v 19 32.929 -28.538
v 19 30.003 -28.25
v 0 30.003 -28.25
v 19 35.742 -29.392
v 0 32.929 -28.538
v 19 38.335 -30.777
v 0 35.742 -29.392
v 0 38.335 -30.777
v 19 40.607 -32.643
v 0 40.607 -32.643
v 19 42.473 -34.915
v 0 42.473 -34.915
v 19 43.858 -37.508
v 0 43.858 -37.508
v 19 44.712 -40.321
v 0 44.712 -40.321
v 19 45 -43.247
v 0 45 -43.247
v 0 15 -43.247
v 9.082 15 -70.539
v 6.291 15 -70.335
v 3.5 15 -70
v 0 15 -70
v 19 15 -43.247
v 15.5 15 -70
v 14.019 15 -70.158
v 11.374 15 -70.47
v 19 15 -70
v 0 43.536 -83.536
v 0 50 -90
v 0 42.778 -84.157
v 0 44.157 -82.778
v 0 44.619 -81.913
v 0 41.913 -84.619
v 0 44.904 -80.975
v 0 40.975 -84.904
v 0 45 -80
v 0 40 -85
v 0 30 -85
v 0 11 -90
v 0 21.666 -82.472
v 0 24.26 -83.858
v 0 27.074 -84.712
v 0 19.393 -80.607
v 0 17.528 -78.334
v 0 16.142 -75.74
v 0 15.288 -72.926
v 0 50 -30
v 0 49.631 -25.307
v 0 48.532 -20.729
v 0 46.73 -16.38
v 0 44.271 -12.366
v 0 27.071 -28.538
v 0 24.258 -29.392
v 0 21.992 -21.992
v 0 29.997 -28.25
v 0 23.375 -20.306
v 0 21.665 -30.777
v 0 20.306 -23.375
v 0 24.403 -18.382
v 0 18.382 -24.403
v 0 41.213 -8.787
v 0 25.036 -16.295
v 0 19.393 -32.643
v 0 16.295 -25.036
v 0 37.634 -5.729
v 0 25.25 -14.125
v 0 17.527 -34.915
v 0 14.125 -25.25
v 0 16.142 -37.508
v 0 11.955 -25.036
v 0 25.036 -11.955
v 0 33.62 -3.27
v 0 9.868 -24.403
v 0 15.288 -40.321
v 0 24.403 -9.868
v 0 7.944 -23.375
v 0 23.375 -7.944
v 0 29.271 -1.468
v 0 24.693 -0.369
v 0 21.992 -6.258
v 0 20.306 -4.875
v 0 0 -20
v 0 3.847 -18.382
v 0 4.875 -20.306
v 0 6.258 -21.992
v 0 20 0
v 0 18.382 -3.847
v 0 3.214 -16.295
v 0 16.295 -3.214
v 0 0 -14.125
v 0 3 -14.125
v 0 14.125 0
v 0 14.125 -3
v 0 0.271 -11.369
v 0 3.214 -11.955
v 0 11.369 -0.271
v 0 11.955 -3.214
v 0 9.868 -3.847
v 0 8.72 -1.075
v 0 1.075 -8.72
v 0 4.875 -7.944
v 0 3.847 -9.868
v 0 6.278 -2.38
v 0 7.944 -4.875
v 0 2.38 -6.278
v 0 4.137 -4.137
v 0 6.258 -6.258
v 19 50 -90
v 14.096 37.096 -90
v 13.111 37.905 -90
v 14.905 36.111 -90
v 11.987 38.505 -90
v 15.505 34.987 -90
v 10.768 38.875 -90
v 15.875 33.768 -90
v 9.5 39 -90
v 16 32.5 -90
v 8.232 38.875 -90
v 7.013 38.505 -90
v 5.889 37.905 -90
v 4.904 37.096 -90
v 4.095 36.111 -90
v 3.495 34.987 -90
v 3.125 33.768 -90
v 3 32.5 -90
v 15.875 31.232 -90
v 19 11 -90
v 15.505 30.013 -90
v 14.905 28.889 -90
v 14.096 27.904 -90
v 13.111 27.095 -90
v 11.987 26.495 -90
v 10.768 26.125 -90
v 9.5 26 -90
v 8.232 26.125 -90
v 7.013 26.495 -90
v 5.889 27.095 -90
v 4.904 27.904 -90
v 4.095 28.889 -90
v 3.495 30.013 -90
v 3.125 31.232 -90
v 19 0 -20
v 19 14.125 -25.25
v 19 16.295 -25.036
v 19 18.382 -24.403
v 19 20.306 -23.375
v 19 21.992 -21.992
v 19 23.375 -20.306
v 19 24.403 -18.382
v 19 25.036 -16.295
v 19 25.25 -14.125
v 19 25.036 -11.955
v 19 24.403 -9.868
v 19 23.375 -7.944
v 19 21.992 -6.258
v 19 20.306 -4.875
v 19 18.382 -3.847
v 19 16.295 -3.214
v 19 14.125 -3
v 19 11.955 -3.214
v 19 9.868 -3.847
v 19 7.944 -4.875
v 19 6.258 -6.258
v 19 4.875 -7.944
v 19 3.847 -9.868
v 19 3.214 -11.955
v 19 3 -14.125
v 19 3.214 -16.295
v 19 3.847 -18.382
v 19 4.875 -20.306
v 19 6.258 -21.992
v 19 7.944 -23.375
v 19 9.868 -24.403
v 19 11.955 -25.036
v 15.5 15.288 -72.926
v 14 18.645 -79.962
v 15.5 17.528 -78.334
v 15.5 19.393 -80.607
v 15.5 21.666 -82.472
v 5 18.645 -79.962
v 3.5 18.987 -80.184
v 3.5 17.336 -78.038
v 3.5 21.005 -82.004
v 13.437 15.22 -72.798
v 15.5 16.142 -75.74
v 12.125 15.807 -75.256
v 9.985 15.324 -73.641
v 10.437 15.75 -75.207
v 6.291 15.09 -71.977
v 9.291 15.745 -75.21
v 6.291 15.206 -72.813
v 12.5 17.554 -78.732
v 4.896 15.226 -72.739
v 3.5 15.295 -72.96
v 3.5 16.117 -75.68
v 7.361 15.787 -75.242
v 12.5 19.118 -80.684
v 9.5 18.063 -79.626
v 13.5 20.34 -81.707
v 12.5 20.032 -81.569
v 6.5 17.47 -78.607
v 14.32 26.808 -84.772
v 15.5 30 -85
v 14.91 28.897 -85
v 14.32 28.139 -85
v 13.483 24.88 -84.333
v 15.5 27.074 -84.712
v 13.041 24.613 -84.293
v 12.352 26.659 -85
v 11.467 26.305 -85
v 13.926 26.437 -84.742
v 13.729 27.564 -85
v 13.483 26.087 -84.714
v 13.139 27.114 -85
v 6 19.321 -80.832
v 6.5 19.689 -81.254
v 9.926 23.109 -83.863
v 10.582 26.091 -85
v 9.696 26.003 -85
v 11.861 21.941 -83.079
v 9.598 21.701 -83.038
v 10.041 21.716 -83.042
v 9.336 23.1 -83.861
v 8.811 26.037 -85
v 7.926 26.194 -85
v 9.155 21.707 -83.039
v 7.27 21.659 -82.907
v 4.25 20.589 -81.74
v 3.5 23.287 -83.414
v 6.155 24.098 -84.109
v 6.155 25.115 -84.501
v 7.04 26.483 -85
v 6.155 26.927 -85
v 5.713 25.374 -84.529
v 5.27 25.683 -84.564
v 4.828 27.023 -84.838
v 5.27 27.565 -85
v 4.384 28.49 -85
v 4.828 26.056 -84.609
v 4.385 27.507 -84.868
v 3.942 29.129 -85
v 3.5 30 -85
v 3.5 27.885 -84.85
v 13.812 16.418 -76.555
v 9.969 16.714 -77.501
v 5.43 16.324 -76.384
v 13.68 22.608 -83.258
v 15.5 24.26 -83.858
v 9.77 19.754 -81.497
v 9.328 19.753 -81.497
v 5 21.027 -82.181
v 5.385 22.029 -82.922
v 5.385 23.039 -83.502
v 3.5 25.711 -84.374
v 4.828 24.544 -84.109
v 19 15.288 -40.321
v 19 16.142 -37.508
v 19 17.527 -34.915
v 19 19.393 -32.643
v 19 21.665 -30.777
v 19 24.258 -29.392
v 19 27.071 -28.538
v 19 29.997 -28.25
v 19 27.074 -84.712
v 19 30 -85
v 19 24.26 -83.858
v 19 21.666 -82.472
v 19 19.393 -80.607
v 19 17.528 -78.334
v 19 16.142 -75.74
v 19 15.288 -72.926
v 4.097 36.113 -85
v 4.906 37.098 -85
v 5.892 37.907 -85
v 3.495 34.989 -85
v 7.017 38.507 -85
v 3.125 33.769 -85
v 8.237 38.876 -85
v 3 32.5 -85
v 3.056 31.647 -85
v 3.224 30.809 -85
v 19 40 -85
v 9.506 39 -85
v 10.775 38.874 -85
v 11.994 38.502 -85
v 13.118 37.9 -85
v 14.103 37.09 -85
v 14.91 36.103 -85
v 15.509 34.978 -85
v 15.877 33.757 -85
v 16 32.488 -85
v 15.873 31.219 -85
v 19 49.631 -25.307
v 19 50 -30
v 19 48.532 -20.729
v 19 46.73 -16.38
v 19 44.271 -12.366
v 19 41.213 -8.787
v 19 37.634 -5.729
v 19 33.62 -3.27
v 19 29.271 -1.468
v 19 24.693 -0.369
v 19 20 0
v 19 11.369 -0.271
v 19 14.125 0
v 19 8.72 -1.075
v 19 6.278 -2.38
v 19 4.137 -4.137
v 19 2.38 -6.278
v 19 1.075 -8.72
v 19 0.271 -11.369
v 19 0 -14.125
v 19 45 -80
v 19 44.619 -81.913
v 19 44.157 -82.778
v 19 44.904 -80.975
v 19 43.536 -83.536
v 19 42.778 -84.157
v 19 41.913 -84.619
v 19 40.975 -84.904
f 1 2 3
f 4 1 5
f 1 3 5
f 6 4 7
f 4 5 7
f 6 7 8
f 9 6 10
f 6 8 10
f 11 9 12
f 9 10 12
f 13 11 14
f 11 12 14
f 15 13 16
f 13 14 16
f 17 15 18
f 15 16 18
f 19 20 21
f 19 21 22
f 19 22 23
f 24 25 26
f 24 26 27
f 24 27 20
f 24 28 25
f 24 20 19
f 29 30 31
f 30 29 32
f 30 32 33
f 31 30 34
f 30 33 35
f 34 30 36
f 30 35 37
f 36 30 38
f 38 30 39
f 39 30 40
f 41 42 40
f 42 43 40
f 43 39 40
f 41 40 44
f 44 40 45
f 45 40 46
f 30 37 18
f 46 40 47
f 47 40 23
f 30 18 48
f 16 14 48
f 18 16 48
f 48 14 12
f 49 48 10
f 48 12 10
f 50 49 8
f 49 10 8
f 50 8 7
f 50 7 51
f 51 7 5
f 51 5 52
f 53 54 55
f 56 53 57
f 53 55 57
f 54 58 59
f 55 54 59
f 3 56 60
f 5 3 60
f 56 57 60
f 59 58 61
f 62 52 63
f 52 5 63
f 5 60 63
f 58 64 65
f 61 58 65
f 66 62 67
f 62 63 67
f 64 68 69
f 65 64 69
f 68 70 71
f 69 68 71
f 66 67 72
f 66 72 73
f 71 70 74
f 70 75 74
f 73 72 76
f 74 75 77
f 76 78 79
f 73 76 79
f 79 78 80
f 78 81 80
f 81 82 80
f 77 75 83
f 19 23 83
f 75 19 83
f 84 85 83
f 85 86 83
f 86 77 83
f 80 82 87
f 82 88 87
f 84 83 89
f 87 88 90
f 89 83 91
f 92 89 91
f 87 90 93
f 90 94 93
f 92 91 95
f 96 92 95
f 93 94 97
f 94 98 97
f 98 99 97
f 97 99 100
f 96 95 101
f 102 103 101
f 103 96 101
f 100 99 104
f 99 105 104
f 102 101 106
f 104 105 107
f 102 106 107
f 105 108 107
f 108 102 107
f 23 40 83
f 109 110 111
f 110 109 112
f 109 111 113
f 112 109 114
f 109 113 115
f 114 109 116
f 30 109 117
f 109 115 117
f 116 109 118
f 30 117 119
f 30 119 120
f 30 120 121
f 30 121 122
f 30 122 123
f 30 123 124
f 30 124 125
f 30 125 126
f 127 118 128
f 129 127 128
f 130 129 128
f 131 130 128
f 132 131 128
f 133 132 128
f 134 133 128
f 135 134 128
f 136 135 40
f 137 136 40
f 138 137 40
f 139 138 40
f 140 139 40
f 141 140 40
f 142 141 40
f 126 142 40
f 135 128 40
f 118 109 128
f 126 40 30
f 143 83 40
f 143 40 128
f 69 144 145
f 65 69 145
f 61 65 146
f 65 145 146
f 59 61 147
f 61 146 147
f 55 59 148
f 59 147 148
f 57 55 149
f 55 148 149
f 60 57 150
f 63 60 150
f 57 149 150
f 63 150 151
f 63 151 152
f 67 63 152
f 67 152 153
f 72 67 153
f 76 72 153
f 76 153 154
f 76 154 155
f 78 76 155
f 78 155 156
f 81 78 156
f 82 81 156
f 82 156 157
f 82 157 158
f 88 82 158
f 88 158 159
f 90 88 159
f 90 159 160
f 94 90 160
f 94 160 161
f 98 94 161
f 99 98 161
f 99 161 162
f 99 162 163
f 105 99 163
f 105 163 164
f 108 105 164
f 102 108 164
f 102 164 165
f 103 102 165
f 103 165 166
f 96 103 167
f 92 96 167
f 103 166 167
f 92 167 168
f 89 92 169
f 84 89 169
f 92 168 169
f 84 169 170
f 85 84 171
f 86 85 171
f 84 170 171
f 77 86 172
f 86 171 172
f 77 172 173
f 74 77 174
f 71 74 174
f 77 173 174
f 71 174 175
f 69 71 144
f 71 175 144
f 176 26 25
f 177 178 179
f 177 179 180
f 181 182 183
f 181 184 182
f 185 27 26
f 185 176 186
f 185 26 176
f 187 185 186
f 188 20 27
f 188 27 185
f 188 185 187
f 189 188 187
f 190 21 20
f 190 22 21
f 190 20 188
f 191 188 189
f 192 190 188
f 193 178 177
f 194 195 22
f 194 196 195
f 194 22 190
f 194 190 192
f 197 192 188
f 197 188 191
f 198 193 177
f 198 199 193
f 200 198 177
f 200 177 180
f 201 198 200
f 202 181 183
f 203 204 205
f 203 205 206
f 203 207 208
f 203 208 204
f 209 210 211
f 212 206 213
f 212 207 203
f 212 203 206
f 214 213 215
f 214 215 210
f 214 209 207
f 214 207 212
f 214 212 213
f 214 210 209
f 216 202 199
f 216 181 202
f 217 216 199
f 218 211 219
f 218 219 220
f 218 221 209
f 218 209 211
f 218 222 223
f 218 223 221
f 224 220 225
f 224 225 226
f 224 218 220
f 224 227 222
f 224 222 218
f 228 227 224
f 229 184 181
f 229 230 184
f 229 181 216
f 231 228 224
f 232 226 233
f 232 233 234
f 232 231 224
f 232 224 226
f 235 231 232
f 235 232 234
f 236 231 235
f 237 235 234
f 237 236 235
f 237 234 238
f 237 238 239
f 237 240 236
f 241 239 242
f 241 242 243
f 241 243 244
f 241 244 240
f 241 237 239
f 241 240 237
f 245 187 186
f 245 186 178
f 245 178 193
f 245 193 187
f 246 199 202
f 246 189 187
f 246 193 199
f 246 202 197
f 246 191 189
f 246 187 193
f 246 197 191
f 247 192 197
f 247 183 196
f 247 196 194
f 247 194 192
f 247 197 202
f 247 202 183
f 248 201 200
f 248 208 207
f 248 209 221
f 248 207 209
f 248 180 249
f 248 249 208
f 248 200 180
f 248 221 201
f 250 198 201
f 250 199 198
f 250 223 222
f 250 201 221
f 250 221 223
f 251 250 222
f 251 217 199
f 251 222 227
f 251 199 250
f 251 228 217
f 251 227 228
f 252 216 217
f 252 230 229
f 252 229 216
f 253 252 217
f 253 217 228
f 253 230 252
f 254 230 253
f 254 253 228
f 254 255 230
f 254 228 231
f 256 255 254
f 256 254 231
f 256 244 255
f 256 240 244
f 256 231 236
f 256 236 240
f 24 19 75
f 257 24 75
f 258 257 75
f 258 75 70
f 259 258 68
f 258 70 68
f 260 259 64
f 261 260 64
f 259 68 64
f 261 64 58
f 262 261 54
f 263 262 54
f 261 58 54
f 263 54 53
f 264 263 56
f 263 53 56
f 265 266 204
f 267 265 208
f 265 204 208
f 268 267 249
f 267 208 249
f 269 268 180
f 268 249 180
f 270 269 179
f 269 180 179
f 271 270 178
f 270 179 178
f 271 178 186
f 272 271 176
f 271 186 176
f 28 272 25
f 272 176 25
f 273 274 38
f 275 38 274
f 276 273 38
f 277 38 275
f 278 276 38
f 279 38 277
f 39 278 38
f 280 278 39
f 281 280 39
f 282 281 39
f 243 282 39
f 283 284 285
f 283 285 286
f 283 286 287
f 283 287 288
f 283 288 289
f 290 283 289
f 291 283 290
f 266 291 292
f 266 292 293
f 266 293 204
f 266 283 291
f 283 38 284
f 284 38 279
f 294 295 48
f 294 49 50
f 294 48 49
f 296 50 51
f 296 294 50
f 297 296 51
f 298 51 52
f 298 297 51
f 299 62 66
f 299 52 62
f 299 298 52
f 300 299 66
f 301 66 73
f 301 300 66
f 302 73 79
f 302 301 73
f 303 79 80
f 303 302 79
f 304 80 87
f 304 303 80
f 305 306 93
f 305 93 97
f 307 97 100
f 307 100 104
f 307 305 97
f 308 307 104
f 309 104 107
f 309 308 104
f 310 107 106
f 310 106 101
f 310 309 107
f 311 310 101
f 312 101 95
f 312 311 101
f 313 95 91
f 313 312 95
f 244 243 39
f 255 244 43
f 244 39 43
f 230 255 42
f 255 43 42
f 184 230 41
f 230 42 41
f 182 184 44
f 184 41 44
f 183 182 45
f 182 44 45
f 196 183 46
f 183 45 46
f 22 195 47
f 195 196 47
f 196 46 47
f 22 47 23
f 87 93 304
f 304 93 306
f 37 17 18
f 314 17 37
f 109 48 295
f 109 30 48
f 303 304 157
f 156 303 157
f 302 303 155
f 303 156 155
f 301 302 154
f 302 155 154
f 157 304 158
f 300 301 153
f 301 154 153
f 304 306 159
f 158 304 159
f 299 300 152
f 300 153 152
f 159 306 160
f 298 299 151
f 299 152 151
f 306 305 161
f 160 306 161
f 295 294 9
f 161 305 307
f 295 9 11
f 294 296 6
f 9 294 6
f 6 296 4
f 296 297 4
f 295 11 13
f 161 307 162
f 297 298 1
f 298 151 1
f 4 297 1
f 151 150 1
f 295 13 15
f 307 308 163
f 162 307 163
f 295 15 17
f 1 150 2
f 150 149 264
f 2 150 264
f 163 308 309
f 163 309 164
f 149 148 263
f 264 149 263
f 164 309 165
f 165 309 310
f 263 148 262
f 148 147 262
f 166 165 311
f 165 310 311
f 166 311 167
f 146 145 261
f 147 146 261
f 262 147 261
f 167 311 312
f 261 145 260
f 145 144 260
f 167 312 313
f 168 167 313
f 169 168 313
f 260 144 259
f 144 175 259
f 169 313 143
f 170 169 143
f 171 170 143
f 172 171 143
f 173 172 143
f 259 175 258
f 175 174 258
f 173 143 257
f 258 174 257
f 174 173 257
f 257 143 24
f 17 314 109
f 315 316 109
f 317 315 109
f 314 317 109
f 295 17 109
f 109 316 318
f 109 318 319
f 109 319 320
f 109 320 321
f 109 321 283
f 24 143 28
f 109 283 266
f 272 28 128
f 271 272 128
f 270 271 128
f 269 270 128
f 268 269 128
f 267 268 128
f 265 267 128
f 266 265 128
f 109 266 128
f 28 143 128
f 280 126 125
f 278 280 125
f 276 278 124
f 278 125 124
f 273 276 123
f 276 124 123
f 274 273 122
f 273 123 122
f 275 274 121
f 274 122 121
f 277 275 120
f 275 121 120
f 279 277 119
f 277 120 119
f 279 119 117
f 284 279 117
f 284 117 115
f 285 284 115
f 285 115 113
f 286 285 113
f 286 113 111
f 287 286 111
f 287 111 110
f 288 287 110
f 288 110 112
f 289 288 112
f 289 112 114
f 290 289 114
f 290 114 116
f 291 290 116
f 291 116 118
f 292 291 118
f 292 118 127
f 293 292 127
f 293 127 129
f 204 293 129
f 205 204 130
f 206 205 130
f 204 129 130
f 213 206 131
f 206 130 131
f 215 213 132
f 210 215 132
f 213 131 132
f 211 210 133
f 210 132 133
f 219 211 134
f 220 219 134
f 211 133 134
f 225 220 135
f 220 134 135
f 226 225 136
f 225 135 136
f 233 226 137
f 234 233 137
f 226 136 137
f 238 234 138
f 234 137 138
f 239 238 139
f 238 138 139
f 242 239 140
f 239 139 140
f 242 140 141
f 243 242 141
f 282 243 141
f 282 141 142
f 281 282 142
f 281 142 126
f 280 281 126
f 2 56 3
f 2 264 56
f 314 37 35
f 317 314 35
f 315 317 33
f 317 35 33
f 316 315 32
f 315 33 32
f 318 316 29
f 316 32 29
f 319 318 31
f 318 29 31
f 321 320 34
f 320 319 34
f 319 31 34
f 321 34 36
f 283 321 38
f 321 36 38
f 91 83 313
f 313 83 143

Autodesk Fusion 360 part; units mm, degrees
sketch "Sketch1" plane through (0, 0, 0) normal (0, 1, 0) x (1, 0, 0)
  line L0 (0, 0) -> (19, 0)
  line L1 (19, 0) -> (19, 90)
  line L2 (19, 90) -> (0, 90)
  line L3 (0, 90) -> (0, 0)
  dimension "d1" = 19
  dimension "d2" = 90
extrude "Extrude1" add sketch "Sketch1" along normal blind 50
sketch "Sketch2" plane through (19, 0, 0) normal (1, 0, 0) x (0, 0, -1)
  line L0 (0, 0) -> (90, 0)
  line L1 (90, 0) -> (90, 50)
  line L2 (90, 50) -> (0, 50)
  line L3 (0, 50) -> (0, 0)
  circle A0 centre (14.125, 14.125) radius 11.125
  line L4 (28.25, 45) -> (85, 45)
  line L5 (85, 45) -> (85, 15)
  line L6 (85, 15) -> (28.25, 15)
  line L7 (28.25, 15) -> (28.25, 45)
  circle A1 centre (14.125, 14.125) radius 14.125
  dimension "d5" = 22.25
  dimension "d7" = 5
  dimension "d8" = 15
  dimension "d9" = 5
  dimension "d10" = 30
  dimension "d24" = 3
extrude "Extrude2" cut sketch "Sketch2" against normal up to surface (19 mm away) contours L0 L3 A1 | A0 | L4 L5 L6 L7
fillet "Fillet1" radius 30 1 edges at (9.5, 50, 0)
sketch "Sketch3" plane through (0, 0, -90) normal (0, 0, -1) x (-1, 0, 0)
  line L0 (-19, 0) -> (0, 0)
  line L1 (0, 0) -> (0, 50)
  line L2 (0, 50) -> (-19, 50)
  line L3 (-19, 50) -> (-19, 0)
  circle A0 centre (-9.5, 32.5) radius 6.5
  line L4 (-9.5, 50) -> (-9.5, 0) construction
  line L5 (-19, 32.5) -> (0, 32.5) construction
  dimension "d17" = 13
  dimension "d29" = 17.5
extrude "Extrude3" cut sketch "Sketch3" against normal up to surface (5 mm away) contours A0
fillet "Fillet2" radius 15 1 edges at (9.5, 15, -85)
fillet "Fillet2" radius 5 1 edges at (9.5, 45, -85)
fillet "Fillet3" radius 15 2 edges at (9.5, 45, -28.25) (9.5, 15, -28.25)
chamfer "Chamfer1" distance 11 distance2 70 1 edges at (9.5, 0, -90) measured on face at (9.6619, 8.6727, -90)
equation "d6 = d5"
